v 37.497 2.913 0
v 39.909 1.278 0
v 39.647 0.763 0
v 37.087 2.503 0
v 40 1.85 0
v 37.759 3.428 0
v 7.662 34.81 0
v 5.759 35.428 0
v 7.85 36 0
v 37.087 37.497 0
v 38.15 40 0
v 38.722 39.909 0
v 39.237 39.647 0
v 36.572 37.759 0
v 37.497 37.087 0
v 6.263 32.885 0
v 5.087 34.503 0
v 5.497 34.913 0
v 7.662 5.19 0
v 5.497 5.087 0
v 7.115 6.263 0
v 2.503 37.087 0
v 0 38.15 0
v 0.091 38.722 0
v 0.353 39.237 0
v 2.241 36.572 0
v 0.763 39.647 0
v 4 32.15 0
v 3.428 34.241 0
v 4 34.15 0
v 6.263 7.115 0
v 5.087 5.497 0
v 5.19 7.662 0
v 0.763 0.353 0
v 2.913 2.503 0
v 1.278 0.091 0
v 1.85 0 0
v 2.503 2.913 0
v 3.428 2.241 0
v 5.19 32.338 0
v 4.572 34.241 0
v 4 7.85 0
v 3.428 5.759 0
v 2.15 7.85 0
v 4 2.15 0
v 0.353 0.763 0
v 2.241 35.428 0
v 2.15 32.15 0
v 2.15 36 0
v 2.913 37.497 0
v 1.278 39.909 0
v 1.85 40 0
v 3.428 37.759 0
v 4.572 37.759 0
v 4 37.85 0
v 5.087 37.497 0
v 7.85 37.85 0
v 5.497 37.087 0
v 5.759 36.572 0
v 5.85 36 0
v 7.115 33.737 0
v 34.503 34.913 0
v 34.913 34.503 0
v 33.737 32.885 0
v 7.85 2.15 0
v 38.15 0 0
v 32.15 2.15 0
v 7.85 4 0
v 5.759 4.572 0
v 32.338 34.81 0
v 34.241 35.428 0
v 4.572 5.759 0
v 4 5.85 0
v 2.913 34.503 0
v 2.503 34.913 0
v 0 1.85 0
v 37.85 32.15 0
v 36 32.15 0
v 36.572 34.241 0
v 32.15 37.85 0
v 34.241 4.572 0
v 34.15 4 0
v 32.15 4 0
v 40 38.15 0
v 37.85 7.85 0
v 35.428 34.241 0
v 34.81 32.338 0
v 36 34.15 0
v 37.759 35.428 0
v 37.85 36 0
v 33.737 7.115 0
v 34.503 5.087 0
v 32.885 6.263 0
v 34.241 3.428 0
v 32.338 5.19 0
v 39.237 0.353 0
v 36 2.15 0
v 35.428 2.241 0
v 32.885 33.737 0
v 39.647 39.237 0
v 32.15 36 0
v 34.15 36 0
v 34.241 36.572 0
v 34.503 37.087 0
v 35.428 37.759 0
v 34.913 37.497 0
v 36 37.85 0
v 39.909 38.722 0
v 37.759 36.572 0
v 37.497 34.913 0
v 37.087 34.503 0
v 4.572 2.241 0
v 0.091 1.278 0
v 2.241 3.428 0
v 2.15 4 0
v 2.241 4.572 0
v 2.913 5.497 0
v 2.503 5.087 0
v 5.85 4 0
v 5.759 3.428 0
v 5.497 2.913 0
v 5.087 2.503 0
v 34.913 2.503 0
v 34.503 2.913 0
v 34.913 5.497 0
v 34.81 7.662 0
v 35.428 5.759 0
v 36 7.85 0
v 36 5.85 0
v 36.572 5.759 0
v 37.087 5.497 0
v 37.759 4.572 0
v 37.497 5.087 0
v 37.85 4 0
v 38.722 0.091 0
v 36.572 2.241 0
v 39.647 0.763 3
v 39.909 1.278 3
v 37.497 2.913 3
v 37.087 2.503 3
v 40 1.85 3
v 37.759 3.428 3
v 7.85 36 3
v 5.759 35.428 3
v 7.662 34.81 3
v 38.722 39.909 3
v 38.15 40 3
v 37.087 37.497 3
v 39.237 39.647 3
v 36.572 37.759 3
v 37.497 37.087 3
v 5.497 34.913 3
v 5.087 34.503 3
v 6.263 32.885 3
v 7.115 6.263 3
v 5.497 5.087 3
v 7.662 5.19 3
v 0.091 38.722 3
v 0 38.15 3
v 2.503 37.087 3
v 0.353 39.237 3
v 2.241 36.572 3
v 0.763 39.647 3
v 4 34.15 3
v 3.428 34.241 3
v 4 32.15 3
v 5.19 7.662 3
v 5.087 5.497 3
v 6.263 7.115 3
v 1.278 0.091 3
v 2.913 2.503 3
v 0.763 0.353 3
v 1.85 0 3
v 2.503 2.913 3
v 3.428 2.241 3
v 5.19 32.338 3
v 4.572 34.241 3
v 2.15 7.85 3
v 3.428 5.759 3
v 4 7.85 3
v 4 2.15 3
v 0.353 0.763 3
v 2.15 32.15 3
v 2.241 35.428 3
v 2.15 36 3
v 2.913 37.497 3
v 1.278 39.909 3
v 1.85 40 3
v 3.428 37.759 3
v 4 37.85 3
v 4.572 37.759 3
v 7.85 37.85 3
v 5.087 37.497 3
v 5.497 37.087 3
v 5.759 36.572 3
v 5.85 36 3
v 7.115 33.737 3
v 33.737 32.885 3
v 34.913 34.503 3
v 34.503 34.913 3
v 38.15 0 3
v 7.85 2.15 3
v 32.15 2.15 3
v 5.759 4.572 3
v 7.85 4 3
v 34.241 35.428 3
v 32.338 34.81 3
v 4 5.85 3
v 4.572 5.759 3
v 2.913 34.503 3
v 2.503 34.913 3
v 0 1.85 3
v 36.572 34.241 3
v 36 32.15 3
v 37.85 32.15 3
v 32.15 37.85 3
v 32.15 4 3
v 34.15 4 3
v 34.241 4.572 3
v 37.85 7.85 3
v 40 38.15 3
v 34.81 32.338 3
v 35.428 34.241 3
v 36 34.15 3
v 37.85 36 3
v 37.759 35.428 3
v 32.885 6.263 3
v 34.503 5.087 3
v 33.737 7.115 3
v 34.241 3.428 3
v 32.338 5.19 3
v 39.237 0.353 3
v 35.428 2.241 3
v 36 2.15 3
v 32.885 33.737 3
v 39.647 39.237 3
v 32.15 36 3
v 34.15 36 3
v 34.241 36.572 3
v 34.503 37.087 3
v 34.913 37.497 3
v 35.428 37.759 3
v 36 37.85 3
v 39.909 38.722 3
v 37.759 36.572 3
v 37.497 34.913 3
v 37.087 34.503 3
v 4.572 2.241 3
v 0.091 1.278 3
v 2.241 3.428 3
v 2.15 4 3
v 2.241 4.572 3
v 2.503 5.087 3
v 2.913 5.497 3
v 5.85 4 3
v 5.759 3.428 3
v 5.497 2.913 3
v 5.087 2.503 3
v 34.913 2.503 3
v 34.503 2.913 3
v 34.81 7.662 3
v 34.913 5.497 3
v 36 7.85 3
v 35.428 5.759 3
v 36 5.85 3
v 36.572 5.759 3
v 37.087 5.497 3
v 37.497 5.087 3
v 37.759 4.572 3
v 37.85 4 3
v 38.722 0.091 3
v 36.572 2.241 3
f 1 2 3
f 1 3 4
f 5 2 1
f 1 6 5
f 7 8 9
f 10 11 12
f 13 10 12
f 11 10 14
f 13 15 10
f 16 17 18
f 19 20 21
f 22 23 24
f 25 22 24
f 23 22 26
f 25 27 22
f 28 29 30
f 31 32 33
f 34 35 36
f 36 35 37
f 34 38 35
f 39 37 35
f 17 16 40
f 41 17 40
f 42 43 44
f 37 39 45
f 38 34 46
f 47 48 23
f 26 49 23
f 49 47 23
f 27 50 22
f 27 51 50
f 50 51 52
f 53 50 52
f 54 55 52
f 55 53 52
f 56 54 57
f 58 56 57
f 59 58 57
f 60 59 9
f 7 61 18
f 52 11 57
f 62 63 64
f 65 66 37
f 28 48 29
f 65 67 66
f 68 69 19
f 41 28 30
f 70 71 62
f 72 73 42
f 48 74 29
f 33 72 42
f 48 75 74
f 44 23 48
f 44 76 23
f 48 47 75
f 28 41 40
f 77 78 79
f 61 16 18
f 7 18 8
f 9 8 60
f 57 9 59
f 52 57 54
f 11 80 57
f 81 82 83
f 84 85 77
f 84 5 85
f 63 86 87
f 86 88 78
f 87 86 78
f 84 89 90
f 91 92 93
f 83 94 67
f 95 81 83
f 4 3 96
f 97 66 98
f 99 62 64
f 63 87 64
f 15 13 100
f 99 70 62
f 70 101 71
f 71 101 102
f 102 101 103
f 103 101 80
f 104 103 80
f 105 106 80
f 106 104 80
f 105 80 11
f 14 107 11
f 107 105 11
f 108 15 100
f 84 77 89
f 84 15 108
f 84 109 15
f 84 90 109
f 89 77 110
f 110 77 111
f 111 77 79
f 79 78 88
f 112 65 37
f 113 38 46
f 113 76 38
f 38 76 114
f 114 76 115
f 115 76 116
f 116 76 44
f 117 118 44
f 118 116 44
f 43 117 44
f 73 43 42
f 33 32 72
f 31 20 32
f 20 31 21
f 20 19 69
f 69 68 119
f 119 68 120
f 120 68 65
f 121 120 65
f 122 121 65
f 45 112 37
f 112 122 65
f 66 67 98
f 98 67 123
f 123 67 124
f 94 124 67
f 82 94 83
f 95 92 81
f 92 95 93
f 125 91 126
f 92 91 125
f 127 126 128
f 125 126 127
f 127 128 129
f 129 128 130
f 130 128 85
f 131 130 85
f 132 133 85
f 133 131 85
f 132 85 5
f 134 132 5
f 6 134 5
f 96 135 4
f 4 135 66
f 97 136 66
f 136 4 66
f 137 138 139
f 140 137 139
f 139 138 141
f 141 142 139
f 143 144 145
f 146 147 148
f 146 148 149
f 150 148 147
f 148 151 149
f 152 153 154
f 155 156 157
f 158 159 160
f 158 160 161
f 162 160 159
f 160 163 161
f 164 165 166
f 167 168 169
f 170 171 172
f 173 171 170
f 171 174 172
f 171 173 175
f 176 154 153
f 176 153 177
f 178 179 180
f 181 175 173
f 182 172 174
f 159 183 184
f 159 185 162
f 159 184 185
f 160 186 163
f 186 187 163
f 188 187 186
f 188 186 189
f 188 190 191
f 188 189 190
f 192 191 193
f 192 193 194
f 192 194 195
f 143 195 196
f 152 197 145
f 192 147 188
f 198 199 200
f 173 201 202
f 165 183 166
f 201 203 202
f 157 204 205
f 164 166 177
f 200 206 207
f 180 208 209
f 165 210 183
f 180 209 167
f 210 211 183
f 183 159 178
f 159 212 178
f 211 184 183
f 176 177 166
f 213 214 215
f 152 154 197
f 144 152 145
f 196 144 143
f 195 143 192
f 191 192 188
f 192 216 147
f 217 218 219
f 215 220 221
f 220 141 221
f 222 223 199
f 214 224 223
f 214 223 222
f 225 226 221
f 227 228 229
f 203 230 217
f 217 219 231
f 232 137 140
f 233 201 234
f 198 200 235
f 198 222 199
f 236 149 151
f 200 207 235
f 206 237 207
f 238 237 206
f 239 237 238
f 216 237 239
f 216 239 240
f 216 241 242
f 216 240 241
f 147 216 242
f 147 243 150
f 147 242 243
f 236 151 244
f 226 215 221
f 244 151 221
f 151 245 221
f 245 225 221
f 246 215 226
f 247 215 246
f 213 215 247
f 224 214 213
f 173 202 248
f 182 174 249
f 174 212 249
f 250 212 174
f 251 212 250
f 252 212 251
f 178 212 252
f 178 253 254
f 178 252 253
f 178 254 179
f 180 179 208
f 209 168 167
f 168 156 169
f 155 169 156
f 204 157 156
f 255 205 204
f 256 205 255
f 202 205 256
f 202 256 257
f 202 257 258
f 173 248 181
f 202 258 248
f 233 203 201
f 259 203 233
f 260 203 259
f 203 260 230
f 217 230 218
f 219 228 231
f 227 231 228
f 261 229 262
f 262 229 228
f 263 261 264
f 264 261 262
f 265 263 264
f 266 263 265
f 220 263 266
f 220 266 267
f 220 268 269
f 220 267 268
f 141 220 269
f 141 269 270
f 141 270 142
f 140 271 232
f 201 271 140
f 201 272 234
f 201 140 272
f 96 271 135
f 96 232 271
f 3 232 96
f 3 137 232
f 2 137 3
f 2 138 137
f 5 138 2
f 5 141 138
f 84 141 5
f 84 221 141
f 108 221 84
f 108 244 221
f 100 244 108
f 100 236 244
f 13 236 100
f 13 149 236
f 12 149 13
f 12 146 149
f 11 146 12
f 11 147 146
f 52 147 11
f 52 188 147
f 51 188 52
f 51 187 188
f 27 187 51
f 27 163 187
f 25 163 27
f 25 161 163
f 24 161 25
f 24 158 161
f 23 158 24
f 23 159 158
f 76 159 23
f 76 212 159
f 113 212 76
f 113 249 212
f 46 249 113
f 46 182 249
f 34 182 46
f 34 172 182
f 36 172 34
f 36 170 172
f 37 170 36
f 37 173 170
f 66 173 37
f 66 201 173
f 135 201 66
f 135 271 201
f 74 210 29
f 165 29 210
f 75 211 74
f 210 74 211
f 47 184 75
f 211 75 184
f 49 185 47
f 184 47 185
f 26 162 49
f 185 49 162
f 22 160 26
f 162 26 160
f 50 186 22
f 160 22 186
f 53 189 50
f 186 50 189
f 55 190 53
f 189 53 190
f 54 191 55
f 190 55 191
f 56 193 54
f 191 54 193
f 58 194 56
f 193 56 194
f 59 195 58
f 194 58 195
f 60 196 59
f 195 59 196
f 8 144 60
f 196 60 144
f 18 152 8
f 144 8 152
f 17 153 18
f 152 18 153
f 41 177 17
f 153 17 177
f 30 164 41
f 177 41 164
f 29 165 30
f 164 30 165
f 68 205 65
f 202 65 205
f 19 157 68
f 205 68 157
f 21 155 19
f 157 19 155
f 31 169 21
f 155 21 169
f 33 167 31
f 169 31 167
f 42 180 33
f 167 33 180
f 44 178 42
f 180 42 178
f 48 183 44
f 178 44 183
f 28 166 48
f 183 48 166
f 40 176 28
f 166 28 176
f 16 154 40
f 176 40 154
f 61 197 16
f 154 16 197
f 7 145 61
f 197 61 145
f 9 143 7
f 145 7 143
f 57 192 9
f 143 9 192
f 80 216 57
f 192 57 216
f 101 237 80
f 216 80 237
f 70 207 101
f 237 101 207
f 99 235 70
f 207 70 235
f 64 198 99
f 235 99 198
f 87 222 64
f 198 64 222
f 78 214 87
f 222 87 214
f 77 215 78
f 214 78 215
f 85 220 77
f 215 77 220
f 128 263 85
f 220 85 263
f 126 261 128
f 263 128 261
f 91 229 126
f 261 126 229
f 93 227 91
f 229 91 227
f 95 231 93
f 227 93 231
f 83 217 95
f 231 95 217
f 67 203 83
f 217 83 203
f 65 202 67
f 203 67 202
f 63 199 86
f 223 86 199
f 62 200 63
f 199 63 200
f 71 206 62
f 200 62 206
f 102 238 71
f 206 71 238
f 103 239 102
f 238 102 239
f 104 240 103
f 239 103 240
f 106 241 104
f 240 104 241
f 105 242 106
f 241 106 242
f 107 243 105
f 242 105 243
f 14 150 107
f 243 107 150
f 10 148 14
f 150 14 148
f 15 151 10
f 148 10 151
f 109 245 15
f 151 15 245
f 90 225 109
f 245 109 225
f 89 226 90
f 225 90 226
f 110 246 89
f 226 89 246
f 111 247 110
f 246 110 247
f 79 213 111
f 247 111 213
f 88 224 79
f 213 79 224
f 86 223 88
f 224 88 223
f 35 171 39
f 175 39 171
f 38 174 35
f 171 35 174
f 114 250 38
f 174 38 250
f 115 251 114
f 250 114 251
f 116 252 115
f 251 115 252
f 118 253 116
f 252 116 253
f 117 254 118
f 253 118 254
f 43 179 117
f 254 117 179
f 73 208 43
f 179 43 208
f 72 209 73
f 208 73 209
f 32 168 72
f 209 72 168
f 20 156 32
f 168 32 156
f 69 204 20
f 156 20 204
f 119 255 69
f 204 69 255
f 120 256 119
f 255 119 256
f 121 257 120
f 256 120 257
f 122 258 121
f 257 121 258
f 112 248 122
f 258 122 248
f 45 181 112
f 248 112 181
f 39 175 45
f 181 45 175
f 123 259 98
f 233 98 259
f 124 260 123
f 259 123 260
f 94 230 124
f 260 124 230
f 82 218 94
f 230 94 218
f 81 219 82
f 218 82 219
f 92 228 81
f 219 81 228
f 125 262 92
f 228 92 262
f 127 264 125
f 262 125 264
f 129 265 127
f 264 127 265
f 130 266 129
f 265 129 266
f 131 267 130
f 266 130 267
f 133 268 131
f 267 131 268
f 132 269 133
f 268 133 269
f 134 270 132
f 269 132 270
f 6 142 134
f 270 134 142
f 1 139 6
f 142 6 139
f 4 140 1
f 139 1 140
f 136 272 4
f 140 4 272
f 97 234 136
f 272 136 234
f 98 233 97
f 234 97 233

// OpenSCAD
/*
OPENSCAD Library file by the DoomMeister
Mounting surround for small DC fans (25 - 120mm)

Data taken from various places around the internet.
http://www.qwikflow.com/dc_fans.html

//Released under the terms of the GNU GPL v3.0
This program is free software: you can redistribute it and/or modify
it under the terms of the GNU General Public License as published by
the Free Software Foundation, either version 3 of the License, or
(at your option) any later version.

This program is distributed in the hope that it will be useful,
but WITHOUT ANY WARRANTY; without even the implied warranty of
MERCHANTABILITY or FITNESS FOR A PARTICULAR PURPOSE. See the
GNU General Public License for more details.

You should have received a copy of the GNU General Public License
along with this program. If not, see <http://www.gnu.org/licenses/>.
*/

//uncomment this for example
fan_mount(size=40,thick=3);

module fan_mount(size=40,thick = 4)
{
if(size == 25)
	{
	_fan_mount(
			fan_size = 25,
			fan_mounting_pitch = 20,
			fan_m_hole_dia = 3,
			holder_thickness = thick
		 );
	}
if(size == 30)
	{
	_fan_mount(
			fan_size = 30,
			fan_mounting_pitch = 24,
			fan_m_hole_dia = 3,
			holder_thickness = thick
		 );
	}

if(size == 40)
	{
	_fan_mount(
			fan_size = 40,
			fan_mounting_pitch = 32,
			fan_m_hole_dia = 3.7,
			holder_thickness = thick
		 );
	}
if(size == 45)
	{
	_fan_mount(
			fan_size = 45,
			fan_mounting_pitch = 37,
			fan_m_hole_dia = 4.3,
			holder_thickness = thick
		 );
	}
if(size == 60)
	{
	_fan_mount(
			fan_size = 60,
			fan_mounting_pitch = 50,
			fan_m_hole_dia = 4.4,
			holder_thickness = thick
		 );
	}
if(size == 80)
	{
	_fan_mount(
			fan_size = 80,
			fan_mounting_pitch = 71.5,
			fan_m_hole_dia = 4.4,
			holder_thickness = thick
		 );
	}

if(size == 120)
	{
	_fan_mount(
			fan_size = 120,
			fan_mounting_pitch = 105,
			fan_m_hole_dia = 4.4,
			holder_thickness = thick
		 );
	}
}


//inner module
module _fan_mount(
			fan_size, //nominsl size of fan
			fan_mounting_pitch, //pitch between mounting holes
			fan_m_hole_dia, //mounting hole diameter
			holder_thickness //user defined thickness
		 )
{

offset1 = (fan_size-(fan_mounting_pitch + fan_m_hole_dia))/2;
offset2 = (fan_size-(fan_mounting_pitch))/2;
offset3 = offset2 + fan_mounting_pitch;
thickness = (fan_size-fan_mounting_pitch)/2;	
			
			//difference()
			//{
			linear_extrude(height = holder_thickness)
			union()
			{	
			difference()
			{
				translate([fan_m_hole_dia/2,fan_m_hole_dia/2,0])
				minkowski()
				{	
					square([fan_size - fan_m_hole_dia,fan_size - fan_m_hole_dia]);
					circle(r= fan_m_hole_dia/2, $fn=20);
				}
			
					translate([offset1,offset1,0])
					square([fan_mounting_pitch + fan_m_hole_dia,fan_mounting_pitch + fan_m_hole_dia]);
				}
				translate([offset2,offset2,0])
				rotate([0,0,0])_corner_hole();
				translate([offset3,offset2,0])
				rotate([0,0,90])_corner_hole();
				translate([offset2,offset3,0])
				rotate([0,0,90])_corner_hole();
				translate([offset3,offset3,0])
				rotate([0,0,0])_corner_hole();
			}

module _corner_hole()
{
				difference(){
					union(){
							difference(){
							square([fan_m_hole_dia + thickness,fan_m_hole_dia + thickness],center=true);
							square([(fan_m_hole_dia + thickness)/2,(fan_m_hole_dia + thickness)/2],center=false);
							translate([-(fan_m_hole_dia + thickness)/2,-(fan_m_hole_dia + thickness)/2])
							square([(fan_m_hole_dia + thickness)/2,(fan_m_hole_dia + thickness)/2],center=false);
							}
					circle(r=(fan_m_hole_dia + thickness)/2, $fn=20);
					}
					circle(r=(fan_m_hole_dia)/2, $fn=20);
				}
}


echo(offset1,offset2,thickness);
}
